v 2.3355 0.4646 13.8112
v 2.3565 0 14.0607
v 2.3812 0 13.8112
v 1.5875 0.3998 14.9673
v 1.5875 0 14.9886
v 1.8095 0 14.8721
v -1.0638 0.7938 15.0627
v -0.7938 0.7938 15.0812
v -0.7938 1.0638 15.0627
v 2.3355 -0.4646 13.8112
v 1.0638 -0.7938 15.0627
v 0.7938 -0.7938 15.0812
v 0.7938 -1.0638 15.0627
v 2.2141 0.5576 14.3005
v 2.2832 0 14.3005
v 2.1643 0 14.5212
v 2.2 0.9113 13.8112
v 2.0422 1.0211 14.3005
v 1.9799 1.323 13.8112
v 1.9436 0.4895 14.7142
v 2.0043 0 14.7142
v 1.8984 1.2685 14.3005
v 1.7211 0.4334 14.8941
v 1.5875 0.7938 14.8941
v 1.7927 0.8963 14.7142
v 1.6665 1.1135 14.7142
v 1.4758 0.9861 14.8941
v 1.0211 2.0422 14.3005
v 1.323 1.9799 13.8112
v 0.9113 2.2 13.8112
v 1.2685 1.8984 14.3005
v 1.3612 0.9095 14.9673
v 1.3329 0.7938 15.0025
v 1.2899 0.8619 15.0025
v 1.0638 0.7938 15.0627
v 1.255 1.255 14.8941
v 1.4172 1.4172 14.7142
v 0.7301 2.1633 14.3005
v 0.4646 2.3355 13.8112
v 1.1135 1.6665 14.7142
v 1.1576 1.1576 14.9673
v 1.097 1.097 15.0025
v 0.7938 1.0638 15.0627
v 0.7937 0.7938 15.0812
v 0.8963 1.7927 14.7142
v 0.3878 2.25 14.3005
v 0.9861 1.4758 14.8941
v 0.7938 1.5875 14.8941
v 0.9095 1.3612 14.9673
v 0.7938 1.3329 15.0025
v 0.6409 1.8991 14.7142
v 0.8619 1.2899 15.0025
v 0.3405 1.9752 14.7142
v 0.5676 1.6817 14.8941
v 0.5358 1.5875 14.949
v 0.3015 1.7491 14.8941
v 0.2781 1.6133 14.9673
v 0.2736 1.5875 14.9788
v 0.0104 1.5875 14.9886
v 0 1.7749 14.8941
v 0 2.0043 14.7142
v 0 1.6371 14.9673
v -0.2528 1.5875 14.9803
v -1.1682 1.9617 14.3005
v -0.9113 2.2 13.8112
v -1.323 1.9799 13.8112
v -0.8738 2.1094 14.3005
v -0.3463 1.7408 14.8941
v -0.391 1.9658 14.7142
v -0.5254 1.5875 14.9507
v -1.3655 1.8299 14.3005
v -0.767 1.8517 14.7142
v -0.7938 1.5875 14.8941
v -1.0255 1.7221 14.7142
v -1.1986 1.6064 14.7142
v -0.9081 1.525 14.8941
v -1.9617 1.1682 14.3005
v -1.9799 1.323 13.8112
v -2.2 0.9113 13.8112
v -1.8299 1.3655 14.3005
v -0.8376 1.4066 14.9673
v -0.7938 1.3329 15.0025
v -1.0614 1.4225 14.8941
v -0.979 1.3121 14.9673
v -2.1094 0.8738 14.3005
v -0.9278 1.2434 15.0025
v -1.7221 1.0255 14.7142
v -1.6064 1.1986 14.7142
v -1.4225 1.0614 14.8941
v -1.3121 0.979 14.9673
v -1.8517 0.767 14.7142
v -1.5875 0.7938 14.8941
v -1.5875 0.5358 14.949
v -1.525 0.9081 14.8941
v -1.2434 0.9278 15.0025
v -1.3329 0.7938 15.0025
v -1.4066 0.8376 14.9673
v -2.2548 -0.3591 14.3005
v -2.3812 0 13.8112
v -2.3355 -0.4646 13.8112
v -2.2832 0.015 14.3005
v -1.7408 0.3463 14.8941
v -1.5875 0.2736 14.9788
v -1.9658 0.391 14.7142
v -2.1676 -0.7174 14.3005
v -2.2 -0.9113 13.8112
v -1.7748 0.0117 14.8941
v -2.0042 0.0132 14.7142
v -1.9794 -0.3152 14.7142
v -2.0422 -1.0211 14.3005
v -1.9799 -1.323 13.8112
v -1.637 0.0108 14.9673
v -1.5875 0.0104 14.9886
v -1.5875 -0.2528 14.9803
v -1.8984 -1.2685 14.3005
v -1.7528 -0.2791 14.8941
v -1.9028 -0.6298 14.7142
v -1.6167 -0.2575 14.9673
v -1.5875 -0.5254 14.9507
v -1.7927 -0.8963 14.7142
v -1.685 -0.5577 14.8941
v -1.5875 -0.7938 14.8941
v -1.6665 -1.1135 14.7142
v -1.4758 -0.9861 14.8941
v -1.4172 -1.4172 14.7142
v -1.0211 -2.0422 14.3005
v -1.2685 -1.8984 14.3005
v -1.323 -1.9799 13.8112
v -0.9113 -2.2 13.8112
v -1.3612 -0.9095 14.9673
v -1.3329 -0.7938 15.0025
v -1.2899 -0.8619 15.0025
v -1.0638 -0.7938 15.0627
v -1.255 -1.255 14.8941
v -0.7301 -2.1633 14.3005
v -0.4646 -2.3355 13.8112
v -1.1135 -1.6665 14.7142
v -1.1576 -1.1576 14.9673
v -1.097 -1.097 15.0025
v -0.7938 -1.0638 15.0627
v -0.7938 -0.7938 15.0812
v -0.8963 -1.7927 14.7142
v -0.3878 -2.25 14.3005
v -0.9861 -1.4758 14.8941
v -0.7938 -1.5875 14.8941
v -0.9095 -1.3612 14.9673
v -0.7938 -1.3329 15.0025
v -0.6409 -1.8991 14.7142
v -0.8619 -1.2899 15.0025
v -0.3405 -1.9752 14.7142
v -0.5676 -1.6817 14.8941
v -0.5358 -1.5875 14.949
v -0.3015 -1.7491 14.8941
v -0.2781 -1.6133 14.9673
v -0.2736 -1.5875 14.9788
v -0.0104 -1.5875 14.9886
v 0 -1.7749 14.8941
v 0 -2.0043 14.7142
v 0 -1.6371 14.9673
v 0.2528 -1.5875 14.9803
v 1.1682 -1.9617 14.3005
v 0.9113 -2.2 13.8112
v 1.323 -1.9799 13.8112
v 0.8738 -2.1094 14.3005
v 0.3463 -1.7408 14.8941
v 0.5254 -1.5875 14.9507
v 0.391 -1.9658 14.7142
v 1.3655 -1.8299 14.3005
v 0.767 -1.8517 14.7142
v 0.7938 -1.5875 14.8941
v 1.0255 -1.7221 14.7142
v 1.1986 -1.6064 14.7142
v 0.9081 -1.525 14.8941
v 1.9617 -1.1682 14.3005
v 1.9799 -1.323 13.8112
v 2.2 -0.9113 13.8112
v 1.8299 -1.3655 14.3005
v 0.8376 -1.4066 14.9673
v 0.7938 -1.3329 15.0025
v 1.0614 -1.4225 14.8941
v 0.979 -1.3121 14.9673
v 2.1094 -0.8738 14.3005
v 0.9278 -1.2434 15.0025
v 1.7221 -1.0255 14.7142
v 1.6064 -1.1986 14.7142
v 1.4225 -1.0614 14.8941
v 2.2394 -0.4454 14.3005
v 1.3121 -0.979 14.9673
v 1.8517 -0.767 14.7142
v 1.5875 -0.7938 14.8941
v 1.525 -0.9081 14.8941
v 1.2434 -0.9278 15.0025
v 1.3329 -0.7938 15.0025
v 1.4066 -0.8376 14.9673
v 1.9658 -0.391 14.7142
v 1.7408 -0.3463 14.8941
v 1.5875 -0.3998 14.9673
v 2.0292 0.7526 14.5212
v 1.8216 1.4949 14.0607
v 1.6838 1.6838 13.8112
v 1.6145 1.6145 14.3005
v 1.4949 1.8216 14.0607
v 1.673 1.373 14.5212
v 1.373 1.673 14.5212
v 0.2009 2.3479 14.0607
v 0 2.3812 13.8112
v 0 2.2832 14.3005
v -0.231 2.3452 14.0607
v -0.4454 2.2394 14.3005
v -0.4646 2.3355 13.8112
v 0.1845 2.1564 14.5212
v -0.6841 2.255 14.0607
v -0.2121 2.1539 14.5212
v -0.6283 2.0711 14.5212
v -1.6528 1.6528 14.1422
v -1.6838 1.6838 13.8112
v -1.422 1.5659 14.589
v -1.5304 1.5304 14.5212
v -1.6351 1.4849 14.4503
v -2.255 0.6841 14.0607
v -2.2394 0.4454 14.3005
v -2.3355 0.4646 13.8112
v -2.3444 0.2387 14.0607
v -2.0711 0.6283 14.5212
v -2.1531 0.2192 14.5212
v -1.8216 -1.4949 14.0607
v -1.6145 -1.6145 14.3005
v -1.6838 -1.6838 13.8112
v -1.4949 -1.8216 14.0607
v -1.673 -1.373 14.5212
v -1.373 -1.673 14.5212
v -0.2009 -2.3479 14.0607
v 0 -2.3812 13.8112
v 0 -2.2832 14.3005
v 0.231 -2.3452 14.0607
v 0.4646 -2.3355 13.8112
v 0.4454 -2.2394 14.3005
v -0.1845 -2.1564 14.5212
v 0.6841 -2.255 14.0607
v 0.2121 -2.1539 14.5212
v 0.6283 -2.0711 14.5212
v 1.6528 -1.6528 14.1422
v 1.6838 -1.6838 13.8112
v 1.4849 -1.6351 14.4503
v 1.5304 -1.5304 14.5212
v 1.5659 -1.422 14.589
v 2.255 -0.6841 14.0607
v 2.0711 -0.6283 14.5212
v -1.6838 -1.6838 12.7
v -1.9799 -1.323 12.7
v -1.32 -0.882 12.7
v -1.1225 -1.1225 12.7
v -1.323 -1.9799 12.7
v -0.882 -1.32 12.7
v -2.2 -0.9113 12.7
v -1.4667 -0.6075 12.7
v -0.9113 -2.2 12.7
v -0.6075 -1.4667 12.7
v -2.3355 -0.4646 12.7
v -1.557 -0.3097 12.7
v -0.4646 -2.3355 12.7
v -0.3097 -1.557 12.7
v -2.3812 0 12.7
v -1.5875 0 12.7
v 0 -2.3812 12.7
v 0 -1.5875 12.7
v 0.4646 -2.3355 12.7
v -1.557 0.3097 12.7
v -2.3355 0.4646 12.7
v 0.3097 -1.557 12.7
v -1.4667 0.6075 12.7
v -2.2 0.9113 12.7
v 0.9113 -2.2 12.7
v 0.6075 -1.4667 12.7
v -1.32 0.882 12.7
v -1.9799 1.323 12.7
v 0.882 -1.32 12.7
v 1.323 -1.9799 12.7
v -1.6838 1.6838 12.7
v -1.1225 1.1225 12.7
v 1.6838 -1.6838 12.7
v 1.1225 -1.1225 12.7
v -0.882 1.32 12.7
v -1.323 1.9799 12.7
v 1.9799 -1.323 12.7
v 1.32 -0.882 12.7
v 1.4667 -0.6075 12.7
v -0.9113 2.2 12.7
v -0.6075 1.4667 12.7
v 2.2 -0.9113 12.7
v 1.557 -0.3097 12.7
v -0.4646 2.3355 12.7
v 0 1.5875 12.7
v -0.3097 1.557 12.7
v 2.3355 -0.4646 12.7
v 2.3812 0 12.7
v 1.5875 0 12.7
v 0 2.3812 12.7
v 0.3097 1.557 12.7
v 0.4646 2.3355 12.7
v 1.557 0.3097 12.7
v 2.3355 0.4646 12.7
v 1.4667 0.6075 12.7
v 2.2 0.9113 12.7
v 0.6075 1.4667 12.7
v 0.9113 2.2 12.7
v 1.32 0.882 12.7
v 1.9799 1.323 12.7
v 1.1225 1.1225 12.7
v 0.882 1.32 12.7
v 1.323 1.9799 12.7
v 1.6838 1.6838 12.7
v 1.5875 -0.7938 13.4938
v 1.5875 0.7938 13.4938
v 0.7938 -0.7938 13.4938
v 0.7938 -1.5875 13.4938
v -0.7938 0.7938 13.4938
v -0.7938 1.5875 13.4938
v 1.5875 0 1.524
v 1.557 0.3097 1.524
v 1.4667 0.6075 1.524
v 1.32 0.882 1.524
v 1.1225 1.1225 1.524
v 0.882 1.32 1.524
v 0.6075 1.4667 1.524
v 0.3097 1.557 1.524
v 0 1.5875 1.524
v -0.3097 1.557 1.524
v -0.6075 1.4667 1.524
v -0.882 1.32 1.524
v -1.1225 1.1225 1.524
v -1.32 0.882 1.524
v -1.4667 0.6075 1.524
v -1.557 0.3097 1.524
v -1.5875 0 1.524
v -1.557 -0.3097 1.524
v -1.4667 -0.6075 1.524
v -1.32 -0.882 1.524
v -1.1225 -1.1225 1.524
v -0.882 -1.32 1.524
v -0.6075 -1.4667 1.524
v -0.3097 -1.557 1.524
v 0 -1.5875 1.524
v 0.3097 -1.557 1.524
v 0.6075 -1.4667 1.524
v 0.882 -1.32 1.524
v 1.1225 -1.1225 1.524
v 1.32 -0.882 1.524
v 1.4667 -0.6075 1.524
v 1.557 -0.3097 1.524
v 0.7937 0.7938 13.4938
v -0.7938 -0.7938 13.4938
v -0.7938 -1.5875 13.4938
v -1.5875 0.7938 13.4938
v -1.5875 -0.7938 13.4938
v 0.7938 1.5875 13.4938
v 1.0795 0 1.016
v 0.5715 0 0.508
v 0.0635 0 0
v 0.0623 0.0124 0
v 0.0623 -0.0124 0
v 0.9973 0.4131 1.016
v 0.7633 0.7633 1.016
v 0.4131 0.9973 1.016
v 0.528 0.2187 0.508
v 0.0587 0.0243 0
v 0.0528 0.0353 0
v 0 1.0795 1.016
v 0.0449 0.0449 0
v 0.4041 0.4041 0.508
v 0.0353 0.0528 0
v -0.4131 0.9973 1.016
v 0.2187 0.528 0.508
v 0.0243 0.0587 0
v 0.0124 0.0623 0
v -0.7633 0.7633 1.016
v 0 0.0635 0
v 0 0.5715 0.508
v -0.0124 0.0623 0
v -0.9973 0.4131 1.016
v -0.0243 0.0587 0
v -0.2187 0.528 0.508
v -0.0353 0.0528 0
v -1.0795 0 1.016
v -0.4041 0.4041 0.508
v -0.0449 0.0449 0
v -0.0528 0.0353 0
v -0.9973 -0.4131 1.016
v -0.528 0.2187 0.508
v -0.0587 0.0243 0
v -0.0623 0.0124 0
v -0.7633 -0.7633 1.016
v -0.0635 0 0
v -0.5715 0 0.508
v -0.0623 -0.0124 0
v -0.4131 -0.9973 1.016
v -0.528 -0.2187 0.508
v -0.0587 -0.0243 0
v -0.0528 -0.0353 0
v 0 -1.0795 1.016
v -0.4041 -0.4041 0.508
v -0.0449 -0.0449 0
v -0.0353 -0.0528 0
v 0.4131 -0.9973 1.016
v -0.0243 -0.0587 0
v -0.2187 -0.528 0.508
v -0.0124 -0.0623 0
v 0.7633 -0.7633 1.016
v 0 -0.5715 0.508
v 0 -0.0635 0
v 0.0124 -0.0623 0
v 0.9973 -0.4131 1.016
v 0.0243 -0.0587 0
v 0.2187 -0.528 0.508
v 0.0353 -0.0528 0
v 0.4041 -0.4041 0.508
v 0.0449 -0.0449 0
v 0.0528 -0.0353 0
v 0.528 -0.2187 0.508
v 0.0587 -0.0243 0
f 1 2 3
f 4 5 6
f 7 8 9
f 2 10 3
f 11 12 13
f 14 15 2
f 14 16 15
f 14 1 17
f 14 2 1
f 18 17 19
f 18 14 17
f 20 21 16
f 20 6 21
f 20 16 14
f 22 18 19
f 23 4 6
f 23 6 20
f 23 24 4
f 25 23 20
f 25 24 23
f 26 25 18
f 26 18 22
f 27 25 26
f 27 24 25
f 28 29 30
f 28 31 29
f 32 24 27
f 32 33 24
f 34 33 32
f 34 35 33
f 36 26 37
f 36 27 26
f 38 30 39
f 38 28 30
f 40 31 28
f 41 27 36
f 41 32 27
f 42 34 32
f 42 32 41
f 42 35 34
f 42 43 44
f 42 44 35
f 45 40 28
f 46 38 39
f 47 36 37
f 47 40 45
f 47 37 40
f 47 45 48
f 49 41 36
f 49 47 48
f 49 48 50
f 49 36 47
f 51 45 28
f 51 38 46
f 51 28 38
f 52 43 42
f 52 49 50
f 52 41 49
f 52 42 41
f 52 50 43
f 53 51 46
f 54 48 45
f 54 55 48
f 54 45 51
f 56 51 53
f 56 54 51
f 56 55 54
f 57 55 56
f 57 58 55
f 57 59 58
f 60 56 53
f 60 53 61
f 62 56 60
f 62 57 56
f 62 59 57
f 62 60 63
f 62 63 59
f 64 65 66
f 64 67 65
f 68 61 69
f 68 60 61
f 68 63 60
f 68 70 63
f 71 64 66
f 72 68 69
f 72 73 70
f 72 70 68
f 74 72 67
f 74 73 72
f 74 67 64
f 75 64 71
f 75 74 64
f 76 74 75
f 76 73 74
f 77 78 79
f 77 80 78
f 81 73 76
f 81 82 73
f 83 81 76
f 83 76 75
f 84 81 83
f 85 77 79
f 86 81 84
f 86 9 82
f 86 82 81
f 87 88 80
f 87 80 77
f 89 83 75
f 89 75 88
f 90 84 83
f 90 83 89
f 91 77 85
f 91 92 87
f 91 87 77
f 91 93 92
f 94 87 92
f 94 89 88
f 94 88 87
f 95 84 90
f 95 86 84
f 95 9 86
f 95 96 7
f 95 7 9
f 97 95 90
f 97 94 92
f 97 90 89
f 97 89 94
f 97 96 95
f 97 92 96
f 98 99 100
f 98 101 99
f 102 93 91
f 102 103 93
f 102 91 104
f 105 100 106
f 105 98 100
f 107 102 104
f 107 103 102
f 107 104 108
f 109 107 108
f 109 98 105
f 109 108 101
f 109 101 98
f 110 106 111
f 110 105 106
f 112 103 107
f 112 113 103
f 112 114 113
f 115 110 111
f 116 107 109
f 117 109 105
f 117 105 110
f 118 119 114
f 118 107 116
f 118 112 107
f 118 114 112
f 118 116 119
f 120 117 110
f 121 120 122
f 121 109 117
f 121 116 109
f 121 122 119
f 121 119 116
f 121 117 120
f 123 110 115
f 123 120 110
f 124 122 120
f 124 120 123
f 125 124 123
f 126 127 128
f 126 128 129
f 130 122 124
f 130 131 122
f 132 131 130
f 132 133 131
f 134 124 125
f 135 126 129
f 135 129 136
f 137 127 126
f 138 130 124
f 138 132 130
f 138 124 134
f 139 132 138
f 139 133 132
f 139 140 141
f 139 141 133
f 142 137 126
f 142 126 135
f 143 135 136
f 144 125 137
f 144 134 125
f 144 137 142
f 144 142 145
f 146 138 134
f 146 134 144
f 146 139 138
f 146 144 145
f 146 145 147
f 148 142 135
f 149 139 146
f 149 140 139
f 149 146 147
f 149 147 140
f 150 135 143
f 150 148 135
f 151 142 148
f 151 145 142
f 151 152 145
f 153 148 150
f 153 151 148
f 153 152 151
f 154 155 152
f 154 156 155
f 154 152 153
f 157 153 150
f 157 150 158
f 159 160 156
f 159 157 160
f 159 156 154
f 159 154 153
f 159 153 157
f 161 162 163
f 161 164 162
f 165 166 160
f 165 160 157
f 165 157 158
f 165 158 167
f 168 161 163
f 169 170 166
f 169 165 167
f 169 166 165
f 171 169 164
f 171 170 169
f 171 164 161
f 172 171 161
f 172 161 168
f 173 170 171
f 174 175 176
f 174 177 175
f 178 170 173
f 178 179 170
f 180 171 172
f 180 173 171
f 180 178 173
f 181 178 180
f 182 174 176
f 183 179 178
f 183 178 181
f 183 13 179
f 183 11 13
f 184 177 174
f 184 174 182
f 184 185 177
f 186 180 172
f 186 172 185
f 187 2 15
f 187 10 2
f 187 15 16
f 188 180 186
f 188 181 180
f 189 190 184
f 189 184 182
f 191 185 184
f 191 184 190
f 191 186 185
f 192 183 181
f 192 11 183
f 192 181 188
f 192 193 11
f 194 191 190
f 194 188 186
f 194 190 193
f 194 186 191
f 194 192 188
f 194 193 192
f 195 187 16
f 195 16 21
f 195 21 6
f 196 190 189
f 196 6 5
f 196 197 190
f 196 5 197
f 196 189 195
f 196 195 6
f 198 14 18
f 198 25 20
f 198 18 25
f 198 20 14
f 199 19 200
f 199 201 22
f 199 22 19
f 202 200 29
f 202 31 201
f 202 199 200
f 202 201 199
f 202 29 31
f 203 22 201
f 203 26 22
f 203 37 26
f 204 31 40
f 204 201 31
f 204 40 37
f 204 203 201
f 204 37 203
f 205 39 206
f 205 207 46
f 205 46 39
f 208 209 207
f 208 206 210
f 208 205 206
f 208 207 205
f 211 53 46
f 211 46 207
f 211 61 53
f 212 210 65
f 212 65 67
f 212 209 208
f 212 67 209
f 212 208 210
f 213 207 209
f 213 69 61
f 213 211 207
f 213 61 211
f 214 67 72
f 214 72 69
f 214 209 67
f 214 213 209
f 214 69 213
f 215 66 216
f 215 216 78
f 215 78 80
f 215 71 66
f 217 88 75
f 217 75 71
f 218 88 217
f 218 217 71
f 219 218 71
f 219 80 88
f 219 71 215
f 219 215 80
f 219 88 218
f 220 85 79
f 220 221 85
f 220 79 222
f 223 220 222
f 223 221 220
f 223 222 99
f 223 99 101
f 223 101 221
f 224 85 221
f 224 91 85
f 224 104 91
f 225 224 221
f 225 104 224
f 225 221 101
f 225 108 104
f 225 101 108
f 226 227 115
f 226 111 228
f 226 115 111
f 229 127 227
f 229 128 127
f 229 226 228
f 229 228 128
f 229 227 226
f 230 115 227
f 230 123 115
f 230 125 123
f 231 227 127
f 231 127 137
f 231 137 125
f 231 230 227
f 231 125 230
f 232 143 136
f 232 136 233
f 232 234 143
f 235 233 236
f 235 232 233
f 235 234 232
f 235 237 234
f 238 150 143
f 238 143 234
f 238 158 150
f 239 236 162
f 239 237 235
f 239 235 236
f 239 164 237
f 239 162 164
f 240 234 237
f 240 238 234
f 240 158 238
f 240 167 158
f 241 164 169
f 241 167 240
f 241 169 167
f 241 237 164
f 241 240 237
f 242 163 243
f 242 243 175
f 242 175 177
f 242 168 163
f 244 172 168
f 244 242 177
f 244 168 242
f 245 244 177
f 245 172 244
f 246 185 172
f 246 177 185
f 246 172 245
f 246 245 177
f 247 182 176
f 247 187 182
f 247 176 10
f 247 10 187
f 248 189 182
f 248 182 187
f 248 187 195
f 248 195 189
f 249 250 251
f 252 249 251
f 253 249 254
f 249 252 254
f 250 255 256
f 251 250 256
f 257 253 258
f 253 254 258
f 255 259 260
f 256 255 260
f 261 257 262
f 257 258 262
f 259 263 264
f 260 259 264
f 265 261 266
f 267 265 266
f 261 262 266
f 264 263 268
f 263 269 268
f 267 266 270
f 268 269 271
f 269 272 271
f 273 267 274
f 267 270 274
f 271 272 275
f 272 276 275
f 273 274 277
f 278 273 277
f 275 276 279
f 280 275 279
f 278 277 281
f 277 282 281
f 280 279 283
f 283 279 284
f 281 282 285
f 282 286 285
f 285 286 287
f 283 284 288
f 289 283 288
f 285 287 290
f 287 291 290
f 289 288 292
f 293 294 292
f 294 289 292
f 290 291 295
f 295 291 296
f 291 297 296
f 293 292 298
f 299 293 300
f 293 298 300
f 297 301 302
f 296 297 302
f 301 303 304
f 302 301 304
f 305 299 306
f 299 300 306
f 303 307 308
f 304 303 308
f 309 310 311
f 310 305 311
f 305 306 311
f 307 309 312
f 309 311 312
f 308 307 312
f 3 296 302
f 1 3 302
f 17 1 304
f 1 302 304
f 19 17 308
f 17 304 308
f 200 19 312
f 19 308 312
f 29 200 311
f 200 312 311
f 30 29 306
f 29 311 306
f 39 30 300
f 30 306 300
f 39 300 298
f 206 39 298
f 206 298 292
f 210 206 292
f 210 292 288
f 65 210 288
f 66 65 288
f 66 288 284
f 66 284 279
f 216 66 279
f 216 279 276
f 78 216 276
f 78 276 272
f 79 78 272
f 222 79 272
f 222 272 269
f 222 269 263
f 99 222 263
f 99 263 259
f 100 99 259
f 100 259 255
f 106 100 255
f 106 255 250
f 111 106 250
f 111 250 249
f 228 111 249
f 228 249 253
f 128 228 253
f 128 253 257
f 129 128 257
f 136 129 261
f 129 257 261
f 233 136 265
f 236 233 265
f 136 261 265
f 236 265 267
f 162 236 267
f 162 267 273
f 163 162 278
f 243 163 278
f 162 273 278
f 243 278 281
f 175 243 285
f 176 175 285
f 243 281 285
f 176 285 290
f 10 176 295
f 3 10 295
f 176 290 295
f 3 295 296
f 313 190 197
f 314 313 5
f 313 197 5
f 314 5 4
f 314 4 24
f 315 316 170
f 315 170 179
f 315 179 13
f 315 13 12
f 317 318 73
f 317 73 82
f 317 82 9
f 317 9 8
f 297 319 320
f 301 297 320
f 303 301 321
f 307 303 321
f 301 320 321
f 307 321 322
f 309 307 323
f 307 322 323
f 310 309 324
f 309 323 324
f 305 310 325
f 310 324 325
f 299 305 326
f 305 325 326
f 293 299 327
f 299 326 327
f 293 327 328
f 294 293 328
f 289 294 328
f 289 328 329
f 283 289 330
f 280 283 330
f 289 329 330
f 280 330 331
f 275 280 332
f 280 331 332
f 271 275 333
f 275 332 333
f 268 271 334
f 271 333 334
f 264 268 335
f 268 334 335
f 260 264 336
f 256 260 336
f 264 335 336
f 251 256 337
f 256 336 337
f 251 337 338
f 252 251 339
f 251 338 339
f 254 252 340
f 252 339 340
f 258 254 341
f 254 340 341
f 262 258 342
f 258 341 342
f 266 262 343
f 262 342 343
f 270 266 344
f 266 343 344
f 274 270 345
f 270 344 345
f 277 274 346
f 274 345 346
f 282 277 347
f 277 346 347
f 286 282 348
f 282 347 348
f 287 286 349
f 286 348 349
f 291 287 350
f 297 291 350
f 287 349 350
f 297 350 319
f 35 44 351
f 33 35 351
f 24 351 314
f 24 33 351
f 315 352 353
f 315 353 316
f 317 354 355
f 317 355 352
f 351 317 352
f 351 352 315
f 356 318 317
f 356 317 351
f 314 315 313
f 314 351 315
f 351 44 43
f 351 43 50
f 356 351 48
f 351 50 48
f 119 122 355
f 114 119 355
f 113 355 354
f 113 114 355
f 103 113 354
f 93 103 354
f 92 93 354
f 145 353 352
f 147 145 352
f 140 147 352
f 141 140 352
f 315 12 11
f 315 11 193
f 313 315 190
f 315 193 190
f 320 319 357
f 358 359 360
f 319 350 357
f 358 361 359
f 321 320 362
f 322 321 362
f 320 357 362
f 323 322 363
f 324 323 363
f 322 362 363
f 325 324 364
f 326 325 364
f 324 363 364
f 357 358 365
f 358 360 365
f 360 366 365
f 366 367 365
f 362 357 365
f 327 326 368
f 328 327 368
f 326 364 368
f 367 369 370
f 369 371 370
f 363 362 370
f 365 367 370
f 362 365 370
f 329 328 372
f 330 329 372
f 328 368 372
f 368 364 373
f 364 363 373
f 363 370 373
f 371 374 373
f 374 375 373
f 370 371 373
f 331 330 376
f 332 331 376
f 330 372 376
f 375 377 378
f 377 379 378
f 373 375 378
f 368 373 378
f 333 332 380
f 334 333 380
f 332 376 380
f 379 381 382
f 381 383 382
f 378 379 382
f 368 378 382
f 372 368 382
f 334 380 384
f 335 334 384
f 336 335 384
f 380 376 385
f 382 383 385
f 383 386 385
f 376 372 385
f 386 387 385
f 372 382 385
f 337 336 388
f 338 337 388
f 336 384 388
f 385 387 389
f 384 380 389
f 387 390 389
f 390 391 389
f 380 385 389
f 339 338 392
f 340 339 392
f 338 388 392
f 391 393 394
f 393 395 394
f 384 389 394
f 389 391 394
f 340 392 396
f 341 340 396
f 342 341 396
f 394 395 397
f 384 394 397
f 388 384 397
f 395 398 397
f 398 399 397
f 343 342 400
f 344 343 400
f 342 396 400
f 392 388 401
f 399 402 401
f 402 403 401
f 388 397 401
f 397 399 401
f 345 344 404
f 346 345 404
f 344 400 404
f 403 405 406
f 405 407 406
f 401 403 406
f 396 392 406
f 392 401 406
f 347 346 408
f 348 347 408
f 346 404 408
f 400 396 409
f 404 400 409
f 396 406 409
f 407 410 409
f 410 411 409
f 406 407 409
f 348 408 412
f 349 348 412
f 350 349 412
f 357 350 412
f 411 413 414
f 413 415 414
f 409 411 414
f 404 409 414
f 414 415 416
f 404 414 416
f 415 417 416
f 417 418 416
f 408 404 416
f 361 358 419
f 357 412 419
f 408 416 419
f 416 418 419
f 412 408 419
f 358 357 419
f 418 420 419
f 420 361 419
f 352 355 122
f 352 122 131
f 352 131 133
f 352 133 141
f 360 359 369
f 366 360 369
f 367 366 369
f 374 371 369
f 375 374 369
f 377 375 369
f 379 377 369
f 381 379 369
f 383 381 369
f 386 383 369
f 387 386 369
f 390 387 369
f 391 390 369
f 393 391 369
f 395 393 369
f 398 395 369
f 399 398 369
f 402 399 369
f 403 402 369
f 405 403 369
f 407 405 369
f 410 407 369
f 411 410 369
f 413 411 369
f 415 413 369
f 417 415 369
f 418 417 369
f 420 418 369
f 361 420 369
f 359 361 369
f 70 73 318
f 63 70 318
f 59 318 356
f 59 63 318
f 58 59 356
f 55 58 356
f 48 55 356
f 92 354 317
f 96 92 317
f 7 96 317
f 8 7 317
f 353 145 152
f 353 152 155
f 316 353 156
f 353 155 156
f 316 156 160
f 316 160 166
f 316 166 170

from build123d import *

# Parameters (mm, degrees)
F0_R     = 1.5875
F1_DEPTH = 12.7
F2_SIZE  = 1.524
F3_R     = 2.38125
F4_DEPTH = 2.38125
F5_W     = 1.5875
F5_H     = 0.79375
F5_W_2   = 0.79375
F5_H_2   = 1.5875
F6_DEPTH = 1.5875


# Not quite as in the source:
# - a fillet or chamfer that OpenCascade refuses, or shapes differently, is made with other operations: its cross-section is extruded or revolved along the edge and cut away or added


with BuildPart() as f1:
    # F0 (on Top) → F1 (new body)
    with BuildSketch(Plane.XY):
        Circle(F0_R)
    extrude(amount=F1_DEPTH)

    # F2
    f2_edges = [f1.edges().sort_by_distance(p)[0] for p in [
        (-1.5875, 0, 0),
    ]]
    chamfer(f2_edges, length=F2_SIZE)

    # F3 (on face) → F4 (join)
    with BuildSketch(Plane.XY.offset(12.7)):
        Circle(F3_R)
    extrude(amount=F4_DEPTH)

    # F5 (on face) → F6 (cut)
    with BuildSketch(Plane.XY.offset(15.08125)):
        with Locations((0, 1.190625)):
            Rectangle(F5_W, F5_H)
        with Locations((1.190625, 0)):
            Rectangle(F5_W_2, F5_H_2)
        Rectangle(F5_W, F5_H_2)
        with Locations((-1.190625, 0)):
            Rectangle(F5_W_2, F5_H_2)
        with Locations((0, -1.190625)):
            Rectangle(F5_W, F5_H)
    extrude(amount=-F6_DEPTH, mode=Mode.SUBTRACT)

    # F7: fillet of radius 1.27 on 1 edges, made by hand

    # F7_s1 → F7_t2 (revolve, cut)
    with BuildSketch(Plane.XZ):
        with BuildLine():
            ThreePointArc((2.38125, 13.81125), (2.0092756121, 14.7092756121), (1.11125, 15.08125))
            Line((1.11125, 15.08125), (2.38125, 15.08125))
            Line((2.38125, 15.08125), (2.38125, 13.81125))
        make_face()
    revolve(axis=Axis((0, 0, 15.08125), (0, 0, 1)), mode=Mode.SUBTRACT)


solid = f1.part
